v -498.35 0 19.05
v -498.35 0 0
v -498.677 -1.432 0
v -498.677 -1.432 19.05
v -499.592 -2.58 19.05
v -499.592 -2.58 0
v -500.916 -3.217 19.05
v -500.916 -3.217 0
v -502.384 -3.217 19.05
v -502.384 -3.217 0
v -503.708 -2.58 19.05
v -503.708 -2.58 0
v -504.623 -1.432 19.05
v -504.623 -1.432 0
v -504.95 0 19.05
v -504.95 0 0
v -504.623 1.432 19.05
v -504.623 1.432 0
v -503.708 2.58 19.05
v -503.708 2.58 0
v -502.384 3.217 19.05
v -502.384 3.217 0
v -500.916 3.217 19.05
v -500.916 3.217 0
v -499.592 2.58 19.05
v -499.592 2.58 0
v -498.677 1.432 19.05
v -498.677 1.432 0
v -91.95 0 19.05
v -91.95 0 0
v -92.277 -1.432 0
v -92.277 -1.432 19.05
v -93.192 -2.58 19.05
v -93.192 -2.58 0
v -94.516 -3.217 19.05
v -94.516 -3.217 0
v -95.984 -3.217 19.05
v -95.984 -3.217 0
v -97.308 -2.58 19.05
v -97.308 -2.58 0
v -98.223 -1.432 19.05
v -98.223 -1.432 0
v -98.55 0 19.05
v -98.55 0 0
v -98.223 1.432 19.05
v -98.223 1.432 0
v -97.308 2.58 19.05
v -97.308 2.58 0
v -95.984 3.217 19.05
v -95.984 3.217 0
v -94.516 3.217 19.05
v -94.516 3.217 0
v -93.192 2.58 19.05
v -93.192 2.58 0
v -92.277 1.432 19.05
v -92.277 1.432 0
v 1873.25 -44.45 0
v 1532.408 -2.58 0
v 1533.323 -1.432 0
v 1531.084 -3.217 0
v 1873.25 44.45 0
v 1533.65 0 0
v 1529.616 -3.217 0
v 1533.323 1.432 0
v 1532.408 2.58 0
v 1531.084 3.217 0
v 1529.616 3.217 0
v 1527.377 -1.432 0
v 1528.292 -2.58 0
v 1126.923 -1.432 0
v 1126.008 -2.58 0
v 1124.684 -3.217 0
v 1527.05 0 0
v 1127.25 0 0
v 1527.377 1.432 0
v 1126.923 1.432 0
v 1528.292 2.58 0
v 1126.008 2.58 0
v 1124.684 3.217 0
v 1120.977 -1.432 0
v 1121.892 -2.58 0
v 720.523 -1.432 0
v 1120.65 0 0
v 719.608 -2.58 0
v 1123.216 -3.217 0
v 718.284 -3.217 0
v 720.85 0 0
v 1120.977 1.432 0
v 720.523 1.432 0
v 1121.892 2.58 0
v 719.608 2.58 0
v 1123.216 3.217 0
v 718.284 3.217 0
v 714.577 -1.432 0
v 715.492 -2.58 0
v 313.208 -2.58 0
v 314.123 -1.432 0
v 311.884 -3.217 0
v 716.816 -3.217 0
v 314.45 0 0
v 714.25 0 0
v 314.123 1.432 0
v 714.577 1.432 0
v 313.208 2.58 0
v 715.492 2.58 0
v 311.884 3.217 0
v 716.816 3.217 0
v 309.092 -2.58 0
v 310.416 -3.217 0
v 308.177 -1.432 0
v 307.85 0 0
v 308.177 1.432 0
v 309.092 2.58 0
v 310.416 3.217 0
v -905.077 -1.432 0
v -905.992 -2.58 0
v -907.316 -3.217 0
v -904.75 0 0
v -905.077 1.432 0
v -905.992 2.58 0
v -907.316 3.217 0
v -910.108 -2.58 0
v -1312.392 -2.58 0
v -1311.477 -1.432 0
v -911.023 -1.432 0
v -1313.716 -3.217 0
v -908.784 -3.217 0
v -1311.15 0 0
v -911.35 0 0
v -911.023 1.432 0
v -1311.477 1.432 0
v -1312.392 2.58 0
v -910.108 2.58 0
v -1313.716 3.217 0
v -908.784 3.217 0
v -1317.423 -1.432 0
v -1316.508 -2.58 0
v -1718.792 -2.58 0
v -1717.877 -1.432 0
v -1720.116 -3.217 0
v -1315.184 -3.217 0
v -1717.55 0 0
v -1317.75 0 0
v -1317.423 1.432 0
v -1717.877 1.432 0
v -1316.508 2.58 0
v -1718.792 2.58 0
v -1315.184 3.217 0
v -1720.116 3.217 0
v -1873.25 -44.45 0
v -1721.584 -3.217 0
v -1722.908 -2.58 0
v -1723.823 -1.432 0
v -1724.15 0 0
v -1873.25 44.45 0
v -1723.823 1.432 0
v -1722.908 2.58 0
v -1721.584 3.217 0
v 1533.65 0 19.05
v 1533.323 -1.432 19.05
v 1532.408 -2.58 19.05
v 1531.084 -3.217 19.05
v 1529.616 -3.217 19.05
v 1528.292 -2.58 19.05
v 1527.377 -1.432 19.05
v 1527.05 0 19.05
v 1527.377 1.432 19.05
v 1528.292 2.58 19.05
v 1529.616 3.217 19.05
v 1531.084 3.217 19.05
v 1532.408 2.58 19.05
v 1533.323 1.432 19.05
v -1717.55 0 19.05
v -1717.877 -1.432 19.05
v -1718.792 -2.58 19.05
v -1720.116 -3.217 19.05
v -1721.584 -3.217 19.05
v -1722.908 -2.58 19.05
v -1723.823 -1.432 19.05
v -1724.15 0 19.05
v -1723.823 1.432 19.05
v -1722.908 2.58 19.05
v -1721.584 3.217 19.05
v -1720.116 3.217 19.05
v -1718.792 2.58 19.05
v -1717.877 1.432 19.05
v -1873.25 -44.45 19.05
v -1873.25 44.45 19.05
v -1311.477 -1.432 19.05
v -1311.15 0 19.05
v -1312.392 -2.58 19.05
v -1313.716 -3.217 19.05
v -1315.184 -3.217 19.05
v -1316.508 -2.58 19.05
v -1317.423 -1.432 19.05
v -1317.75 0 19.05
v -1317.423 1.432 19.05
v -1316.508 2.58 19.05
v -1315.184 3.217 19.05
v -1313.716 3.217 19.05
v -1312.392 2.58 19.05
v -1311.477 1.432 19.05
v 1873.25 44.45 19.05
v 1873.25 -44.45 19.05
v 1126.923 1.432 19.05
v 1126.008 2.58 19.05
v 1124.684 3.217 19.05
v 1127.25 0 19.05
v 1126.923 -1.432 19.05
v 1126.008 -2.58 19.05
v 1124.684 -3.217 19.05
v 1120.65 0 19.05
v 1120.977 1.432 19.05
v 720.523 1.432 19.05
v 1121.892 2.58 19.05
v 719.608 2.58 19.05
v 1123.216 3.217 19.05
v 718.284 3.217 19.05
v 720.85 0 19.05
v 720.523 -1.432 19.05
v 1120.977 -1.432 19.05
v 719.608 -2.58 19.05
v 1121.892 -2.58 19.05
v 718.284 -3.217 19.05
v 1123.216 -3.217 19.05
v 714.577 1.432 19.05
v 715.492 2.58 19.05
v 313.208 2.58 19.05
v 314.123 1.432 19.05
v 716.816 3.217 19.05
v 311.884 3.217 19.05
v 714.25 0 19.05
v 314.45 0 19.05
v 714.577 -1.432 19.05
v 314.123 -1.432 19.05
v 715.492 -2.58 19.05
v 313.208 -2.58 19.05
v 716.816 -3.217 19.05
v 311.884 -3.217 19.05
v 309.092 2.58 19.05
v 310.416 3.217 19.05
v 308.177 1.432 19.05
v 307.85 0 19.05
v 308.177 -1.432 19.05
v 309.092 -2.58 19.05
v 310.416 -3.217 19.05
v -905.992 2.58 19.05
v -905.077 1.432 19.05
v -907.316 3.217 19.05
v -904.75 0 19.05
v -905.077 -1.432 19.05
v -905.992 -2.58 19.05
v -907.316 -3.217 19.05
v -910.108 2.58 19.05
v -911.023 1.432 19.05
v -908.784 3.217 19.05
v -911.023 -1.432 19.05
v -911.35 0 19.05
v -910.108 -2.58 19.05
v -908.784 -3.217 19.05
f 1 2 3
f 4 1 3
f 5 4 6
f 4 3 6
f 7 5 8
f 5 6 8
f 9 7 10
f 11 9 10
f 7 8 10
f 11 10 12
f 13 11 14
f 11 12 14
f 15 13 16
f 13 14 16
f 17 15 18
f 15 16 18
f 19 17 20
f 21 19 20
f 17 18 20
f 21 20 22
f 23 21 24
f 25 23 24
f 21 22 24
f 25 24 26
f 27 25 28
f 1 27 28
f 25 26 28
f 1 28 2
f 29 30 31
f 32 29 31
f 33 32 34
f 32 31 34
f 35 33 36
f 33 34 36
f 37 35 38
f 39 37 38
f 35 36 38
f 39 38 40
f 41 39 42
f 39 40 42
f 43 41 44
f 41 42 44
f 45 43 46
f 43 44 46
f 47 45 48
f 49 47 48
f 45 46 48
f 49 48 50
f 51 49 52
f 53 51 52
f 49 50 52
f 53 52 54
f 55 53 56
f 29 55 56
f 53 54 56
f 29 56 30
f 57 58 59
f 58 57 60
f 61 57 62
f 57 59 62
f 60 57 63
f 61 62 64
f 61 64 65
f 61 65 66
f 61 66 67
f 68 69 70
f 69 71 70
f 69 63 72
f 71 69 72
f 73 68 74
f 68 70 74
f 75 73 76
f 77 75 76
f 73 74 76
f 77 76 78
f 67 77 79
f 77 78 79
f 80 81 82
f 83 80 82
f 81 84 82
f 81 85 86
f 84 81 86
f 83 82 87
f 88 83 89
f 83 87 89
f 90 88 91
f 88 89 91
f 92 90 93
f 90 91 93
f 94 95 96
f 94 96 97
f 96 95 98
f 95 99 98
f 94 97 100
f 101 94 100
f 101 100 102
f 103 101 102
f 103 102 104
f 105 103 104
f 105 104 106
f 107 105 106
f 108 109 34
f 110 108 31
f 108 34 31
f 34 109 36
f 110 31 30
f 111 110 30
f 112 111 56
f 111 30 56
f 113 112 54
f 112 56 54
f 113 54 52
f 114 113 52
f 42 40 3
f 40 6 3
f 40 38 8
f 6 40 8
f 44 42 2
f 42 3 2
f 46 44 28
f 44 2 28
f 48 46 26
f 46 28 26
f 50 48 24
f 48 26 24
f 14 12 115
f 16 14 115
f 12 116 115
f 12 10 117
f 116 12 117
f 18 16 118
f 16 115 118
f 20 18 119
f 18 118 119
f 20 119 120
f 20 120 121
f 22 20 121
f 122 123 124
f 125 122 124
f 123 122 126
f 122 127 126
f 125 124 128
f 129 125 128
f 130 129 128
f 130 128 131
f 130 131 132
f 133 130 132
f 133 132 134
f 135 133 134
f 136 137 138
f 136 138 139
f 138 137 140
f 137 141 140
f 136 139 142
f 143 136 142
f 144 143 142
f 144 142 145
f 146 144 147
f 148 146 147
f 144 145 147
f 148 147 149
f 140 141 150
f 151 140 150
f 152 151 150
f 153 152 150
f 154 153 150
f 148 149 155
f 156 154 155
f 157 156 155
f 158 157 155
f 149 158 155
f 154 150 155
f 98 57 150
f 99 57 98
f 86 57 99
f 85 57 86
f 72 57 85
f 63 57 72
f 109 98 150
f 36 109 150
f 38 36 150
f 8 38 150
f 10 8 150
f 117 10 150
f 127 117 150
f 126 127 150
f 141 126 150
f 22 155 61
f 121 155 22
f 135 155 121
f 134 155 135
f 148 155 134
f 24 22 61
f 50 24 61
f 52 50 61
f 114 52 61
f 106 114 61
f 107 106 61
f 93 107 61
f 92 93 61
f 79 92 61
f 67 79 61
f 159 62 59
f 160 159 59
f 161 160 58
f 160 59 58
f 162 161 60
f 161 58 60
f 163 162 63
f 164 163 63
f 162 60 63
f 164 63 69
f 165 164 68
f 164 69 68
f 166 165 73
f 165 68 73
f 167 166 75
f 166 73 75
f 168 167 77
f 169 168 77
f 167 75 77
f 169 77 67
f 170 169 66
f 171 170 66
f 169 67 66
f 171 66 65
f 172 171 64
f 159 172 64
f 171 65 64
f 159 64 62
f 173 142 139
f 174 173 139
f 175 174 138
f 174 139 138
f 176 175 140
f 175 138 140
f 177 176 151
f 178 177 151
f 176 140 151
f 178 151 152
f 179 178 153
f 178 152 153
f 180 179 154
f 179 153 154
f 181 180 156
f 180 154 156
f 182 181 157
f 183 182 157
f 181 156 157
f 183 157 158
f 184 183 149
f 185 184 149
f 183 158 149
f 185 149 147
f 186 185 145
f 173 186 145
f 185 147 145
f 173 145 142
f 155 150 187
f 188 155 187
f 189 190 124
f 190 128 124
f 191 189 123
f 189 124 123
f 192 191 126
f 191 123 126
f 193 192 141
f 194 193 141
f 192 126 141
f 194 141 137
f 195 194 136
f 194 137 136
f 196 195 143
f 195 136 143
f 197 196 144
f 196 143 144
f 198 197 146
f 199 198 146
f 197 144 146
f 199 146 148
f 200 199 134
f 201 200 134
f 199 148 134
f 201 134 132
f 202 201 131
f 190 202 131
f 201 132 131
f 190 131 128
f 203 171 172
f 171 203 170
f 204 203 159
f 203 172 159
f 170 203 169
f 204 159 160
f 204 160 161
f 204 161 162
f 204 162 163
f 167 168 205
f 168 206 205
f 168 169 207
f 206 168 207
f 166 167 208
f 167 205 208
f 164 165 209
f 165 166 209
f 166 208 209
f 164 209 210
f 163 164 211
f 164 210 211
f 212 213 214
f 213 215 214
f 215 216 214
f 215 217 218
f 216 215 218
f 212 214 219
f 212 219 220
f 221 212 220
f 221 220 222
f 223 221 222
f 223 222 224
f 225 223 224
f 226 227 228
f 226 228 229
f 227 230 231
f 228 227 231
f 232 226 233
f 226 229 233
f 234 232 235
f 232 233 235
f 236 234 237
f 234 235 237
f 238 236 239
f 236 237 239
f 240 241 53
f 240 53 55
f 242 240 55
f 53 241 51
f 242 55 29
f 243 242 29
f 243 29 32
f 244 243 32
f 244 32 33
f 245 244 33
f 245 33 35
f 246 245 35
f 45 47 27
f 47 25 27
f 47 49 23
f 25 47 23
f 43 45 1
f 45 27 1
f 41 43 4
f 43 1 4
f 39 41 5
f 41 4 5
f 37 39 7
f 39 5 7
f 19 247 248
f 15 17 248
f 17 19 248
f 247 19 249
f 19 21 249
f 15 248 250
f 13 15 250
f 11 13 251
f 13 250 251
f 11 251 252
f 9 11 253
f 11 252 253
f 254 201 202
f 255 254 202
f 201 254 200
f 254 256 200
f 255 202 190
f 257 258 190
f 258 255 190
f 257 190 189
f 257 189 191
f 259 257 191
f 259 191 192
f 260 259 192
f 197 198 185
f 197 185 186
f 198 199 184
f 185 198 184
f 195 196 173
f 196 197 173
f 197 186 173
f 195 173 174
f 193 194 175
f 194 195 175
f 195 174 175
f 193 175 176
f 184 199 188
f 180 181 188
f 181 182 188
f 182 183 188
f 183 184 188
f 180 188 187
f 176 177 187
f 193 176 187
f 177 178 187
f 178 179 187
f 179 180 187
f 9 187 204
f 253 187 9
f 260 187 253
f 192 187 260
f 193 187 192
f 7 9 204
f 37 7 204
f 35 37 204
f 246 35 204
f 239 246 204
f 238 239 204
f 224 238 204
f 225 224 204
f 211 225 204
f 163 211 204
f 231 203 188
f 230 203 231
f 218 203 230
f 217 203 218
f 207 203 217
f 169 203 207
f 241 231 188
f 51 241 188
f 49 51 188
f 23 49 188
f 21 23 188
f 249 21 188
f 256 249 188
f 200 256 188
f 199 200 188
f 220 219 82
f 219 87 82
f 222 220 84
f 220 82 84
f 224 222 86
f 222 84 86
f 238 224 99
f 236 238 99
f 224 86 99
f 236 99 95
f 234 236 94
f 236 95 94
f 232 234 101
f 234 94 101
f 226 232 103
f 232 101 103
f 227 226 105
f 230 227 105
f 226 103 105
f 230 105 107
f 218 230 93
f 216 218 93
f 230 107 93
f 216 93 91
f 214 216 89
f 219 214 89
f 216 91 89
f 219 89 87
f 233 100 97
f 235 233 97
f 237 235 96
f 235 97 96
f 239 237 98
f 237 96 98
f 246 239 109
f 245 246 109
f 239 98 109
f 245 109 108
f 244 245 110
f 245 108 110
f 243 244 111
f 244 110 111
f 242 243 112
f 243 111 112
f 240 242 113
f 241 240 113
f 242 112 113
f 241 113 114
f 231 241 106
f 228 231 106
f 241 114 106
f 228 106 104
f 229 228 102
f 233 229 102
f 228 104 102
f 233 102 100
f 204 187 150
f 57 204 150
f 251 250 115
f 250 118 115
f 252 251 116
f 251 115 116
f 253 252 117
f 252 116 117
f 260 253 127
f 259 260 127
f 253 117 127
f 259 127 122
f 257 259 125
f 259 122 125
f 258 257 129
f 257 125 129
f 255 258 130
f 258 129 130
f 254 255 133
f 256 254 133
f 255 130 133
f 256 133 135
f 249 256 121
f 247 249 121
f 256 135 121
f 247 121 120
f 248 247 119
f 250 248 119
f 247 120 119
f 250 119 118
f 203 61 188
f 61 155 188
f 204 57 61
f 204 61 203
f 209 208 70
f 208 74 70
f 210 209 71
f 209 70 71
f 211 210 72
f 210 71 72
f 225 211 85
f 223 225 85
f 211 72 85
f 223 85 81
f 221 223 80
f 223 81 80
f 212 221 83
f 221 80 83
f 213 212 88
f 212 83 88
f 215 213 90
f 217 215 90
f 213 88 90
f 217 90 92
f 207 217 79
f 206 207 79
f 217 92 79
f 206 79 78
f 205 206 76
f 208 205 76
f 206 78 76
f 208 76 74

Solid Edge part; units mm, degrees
sketch "Sketch1" plane through (0, 0, 0) normal (1, 0, 0) x (0, 1, 0)
  line L0 (-44.45, 0) -> (44.45, 0)
  line L1 (44.45, 0) -> (44.45, 19.05)
  line L2 (44.45, 19.05) -> (-44.45, 19.05)
  line L3 (-44.45, 19.05) -> (-44.45, 0)
  dimension "D1" = 88.9
  dimension "D2" = 19.05
extrude "Protrusion1" add sketch "Sketch1" along normal mid plane 3746.5
sketch "Sketch2" plane through (0, 0, 0) normal (0, 0, -1) x (1, 0, 0)
  circle A0 centre (-1720.85, 0) radius 3.3
  dimension "D1" = 6.6
  dimension "D2" = 152.4
extrude "Cutout1" cut sketch "Sketch2" against normal through all
pattern_linear "Pattern1" count 9 spacing 406.4 along (1, 0, 0) of "Cutout1"
